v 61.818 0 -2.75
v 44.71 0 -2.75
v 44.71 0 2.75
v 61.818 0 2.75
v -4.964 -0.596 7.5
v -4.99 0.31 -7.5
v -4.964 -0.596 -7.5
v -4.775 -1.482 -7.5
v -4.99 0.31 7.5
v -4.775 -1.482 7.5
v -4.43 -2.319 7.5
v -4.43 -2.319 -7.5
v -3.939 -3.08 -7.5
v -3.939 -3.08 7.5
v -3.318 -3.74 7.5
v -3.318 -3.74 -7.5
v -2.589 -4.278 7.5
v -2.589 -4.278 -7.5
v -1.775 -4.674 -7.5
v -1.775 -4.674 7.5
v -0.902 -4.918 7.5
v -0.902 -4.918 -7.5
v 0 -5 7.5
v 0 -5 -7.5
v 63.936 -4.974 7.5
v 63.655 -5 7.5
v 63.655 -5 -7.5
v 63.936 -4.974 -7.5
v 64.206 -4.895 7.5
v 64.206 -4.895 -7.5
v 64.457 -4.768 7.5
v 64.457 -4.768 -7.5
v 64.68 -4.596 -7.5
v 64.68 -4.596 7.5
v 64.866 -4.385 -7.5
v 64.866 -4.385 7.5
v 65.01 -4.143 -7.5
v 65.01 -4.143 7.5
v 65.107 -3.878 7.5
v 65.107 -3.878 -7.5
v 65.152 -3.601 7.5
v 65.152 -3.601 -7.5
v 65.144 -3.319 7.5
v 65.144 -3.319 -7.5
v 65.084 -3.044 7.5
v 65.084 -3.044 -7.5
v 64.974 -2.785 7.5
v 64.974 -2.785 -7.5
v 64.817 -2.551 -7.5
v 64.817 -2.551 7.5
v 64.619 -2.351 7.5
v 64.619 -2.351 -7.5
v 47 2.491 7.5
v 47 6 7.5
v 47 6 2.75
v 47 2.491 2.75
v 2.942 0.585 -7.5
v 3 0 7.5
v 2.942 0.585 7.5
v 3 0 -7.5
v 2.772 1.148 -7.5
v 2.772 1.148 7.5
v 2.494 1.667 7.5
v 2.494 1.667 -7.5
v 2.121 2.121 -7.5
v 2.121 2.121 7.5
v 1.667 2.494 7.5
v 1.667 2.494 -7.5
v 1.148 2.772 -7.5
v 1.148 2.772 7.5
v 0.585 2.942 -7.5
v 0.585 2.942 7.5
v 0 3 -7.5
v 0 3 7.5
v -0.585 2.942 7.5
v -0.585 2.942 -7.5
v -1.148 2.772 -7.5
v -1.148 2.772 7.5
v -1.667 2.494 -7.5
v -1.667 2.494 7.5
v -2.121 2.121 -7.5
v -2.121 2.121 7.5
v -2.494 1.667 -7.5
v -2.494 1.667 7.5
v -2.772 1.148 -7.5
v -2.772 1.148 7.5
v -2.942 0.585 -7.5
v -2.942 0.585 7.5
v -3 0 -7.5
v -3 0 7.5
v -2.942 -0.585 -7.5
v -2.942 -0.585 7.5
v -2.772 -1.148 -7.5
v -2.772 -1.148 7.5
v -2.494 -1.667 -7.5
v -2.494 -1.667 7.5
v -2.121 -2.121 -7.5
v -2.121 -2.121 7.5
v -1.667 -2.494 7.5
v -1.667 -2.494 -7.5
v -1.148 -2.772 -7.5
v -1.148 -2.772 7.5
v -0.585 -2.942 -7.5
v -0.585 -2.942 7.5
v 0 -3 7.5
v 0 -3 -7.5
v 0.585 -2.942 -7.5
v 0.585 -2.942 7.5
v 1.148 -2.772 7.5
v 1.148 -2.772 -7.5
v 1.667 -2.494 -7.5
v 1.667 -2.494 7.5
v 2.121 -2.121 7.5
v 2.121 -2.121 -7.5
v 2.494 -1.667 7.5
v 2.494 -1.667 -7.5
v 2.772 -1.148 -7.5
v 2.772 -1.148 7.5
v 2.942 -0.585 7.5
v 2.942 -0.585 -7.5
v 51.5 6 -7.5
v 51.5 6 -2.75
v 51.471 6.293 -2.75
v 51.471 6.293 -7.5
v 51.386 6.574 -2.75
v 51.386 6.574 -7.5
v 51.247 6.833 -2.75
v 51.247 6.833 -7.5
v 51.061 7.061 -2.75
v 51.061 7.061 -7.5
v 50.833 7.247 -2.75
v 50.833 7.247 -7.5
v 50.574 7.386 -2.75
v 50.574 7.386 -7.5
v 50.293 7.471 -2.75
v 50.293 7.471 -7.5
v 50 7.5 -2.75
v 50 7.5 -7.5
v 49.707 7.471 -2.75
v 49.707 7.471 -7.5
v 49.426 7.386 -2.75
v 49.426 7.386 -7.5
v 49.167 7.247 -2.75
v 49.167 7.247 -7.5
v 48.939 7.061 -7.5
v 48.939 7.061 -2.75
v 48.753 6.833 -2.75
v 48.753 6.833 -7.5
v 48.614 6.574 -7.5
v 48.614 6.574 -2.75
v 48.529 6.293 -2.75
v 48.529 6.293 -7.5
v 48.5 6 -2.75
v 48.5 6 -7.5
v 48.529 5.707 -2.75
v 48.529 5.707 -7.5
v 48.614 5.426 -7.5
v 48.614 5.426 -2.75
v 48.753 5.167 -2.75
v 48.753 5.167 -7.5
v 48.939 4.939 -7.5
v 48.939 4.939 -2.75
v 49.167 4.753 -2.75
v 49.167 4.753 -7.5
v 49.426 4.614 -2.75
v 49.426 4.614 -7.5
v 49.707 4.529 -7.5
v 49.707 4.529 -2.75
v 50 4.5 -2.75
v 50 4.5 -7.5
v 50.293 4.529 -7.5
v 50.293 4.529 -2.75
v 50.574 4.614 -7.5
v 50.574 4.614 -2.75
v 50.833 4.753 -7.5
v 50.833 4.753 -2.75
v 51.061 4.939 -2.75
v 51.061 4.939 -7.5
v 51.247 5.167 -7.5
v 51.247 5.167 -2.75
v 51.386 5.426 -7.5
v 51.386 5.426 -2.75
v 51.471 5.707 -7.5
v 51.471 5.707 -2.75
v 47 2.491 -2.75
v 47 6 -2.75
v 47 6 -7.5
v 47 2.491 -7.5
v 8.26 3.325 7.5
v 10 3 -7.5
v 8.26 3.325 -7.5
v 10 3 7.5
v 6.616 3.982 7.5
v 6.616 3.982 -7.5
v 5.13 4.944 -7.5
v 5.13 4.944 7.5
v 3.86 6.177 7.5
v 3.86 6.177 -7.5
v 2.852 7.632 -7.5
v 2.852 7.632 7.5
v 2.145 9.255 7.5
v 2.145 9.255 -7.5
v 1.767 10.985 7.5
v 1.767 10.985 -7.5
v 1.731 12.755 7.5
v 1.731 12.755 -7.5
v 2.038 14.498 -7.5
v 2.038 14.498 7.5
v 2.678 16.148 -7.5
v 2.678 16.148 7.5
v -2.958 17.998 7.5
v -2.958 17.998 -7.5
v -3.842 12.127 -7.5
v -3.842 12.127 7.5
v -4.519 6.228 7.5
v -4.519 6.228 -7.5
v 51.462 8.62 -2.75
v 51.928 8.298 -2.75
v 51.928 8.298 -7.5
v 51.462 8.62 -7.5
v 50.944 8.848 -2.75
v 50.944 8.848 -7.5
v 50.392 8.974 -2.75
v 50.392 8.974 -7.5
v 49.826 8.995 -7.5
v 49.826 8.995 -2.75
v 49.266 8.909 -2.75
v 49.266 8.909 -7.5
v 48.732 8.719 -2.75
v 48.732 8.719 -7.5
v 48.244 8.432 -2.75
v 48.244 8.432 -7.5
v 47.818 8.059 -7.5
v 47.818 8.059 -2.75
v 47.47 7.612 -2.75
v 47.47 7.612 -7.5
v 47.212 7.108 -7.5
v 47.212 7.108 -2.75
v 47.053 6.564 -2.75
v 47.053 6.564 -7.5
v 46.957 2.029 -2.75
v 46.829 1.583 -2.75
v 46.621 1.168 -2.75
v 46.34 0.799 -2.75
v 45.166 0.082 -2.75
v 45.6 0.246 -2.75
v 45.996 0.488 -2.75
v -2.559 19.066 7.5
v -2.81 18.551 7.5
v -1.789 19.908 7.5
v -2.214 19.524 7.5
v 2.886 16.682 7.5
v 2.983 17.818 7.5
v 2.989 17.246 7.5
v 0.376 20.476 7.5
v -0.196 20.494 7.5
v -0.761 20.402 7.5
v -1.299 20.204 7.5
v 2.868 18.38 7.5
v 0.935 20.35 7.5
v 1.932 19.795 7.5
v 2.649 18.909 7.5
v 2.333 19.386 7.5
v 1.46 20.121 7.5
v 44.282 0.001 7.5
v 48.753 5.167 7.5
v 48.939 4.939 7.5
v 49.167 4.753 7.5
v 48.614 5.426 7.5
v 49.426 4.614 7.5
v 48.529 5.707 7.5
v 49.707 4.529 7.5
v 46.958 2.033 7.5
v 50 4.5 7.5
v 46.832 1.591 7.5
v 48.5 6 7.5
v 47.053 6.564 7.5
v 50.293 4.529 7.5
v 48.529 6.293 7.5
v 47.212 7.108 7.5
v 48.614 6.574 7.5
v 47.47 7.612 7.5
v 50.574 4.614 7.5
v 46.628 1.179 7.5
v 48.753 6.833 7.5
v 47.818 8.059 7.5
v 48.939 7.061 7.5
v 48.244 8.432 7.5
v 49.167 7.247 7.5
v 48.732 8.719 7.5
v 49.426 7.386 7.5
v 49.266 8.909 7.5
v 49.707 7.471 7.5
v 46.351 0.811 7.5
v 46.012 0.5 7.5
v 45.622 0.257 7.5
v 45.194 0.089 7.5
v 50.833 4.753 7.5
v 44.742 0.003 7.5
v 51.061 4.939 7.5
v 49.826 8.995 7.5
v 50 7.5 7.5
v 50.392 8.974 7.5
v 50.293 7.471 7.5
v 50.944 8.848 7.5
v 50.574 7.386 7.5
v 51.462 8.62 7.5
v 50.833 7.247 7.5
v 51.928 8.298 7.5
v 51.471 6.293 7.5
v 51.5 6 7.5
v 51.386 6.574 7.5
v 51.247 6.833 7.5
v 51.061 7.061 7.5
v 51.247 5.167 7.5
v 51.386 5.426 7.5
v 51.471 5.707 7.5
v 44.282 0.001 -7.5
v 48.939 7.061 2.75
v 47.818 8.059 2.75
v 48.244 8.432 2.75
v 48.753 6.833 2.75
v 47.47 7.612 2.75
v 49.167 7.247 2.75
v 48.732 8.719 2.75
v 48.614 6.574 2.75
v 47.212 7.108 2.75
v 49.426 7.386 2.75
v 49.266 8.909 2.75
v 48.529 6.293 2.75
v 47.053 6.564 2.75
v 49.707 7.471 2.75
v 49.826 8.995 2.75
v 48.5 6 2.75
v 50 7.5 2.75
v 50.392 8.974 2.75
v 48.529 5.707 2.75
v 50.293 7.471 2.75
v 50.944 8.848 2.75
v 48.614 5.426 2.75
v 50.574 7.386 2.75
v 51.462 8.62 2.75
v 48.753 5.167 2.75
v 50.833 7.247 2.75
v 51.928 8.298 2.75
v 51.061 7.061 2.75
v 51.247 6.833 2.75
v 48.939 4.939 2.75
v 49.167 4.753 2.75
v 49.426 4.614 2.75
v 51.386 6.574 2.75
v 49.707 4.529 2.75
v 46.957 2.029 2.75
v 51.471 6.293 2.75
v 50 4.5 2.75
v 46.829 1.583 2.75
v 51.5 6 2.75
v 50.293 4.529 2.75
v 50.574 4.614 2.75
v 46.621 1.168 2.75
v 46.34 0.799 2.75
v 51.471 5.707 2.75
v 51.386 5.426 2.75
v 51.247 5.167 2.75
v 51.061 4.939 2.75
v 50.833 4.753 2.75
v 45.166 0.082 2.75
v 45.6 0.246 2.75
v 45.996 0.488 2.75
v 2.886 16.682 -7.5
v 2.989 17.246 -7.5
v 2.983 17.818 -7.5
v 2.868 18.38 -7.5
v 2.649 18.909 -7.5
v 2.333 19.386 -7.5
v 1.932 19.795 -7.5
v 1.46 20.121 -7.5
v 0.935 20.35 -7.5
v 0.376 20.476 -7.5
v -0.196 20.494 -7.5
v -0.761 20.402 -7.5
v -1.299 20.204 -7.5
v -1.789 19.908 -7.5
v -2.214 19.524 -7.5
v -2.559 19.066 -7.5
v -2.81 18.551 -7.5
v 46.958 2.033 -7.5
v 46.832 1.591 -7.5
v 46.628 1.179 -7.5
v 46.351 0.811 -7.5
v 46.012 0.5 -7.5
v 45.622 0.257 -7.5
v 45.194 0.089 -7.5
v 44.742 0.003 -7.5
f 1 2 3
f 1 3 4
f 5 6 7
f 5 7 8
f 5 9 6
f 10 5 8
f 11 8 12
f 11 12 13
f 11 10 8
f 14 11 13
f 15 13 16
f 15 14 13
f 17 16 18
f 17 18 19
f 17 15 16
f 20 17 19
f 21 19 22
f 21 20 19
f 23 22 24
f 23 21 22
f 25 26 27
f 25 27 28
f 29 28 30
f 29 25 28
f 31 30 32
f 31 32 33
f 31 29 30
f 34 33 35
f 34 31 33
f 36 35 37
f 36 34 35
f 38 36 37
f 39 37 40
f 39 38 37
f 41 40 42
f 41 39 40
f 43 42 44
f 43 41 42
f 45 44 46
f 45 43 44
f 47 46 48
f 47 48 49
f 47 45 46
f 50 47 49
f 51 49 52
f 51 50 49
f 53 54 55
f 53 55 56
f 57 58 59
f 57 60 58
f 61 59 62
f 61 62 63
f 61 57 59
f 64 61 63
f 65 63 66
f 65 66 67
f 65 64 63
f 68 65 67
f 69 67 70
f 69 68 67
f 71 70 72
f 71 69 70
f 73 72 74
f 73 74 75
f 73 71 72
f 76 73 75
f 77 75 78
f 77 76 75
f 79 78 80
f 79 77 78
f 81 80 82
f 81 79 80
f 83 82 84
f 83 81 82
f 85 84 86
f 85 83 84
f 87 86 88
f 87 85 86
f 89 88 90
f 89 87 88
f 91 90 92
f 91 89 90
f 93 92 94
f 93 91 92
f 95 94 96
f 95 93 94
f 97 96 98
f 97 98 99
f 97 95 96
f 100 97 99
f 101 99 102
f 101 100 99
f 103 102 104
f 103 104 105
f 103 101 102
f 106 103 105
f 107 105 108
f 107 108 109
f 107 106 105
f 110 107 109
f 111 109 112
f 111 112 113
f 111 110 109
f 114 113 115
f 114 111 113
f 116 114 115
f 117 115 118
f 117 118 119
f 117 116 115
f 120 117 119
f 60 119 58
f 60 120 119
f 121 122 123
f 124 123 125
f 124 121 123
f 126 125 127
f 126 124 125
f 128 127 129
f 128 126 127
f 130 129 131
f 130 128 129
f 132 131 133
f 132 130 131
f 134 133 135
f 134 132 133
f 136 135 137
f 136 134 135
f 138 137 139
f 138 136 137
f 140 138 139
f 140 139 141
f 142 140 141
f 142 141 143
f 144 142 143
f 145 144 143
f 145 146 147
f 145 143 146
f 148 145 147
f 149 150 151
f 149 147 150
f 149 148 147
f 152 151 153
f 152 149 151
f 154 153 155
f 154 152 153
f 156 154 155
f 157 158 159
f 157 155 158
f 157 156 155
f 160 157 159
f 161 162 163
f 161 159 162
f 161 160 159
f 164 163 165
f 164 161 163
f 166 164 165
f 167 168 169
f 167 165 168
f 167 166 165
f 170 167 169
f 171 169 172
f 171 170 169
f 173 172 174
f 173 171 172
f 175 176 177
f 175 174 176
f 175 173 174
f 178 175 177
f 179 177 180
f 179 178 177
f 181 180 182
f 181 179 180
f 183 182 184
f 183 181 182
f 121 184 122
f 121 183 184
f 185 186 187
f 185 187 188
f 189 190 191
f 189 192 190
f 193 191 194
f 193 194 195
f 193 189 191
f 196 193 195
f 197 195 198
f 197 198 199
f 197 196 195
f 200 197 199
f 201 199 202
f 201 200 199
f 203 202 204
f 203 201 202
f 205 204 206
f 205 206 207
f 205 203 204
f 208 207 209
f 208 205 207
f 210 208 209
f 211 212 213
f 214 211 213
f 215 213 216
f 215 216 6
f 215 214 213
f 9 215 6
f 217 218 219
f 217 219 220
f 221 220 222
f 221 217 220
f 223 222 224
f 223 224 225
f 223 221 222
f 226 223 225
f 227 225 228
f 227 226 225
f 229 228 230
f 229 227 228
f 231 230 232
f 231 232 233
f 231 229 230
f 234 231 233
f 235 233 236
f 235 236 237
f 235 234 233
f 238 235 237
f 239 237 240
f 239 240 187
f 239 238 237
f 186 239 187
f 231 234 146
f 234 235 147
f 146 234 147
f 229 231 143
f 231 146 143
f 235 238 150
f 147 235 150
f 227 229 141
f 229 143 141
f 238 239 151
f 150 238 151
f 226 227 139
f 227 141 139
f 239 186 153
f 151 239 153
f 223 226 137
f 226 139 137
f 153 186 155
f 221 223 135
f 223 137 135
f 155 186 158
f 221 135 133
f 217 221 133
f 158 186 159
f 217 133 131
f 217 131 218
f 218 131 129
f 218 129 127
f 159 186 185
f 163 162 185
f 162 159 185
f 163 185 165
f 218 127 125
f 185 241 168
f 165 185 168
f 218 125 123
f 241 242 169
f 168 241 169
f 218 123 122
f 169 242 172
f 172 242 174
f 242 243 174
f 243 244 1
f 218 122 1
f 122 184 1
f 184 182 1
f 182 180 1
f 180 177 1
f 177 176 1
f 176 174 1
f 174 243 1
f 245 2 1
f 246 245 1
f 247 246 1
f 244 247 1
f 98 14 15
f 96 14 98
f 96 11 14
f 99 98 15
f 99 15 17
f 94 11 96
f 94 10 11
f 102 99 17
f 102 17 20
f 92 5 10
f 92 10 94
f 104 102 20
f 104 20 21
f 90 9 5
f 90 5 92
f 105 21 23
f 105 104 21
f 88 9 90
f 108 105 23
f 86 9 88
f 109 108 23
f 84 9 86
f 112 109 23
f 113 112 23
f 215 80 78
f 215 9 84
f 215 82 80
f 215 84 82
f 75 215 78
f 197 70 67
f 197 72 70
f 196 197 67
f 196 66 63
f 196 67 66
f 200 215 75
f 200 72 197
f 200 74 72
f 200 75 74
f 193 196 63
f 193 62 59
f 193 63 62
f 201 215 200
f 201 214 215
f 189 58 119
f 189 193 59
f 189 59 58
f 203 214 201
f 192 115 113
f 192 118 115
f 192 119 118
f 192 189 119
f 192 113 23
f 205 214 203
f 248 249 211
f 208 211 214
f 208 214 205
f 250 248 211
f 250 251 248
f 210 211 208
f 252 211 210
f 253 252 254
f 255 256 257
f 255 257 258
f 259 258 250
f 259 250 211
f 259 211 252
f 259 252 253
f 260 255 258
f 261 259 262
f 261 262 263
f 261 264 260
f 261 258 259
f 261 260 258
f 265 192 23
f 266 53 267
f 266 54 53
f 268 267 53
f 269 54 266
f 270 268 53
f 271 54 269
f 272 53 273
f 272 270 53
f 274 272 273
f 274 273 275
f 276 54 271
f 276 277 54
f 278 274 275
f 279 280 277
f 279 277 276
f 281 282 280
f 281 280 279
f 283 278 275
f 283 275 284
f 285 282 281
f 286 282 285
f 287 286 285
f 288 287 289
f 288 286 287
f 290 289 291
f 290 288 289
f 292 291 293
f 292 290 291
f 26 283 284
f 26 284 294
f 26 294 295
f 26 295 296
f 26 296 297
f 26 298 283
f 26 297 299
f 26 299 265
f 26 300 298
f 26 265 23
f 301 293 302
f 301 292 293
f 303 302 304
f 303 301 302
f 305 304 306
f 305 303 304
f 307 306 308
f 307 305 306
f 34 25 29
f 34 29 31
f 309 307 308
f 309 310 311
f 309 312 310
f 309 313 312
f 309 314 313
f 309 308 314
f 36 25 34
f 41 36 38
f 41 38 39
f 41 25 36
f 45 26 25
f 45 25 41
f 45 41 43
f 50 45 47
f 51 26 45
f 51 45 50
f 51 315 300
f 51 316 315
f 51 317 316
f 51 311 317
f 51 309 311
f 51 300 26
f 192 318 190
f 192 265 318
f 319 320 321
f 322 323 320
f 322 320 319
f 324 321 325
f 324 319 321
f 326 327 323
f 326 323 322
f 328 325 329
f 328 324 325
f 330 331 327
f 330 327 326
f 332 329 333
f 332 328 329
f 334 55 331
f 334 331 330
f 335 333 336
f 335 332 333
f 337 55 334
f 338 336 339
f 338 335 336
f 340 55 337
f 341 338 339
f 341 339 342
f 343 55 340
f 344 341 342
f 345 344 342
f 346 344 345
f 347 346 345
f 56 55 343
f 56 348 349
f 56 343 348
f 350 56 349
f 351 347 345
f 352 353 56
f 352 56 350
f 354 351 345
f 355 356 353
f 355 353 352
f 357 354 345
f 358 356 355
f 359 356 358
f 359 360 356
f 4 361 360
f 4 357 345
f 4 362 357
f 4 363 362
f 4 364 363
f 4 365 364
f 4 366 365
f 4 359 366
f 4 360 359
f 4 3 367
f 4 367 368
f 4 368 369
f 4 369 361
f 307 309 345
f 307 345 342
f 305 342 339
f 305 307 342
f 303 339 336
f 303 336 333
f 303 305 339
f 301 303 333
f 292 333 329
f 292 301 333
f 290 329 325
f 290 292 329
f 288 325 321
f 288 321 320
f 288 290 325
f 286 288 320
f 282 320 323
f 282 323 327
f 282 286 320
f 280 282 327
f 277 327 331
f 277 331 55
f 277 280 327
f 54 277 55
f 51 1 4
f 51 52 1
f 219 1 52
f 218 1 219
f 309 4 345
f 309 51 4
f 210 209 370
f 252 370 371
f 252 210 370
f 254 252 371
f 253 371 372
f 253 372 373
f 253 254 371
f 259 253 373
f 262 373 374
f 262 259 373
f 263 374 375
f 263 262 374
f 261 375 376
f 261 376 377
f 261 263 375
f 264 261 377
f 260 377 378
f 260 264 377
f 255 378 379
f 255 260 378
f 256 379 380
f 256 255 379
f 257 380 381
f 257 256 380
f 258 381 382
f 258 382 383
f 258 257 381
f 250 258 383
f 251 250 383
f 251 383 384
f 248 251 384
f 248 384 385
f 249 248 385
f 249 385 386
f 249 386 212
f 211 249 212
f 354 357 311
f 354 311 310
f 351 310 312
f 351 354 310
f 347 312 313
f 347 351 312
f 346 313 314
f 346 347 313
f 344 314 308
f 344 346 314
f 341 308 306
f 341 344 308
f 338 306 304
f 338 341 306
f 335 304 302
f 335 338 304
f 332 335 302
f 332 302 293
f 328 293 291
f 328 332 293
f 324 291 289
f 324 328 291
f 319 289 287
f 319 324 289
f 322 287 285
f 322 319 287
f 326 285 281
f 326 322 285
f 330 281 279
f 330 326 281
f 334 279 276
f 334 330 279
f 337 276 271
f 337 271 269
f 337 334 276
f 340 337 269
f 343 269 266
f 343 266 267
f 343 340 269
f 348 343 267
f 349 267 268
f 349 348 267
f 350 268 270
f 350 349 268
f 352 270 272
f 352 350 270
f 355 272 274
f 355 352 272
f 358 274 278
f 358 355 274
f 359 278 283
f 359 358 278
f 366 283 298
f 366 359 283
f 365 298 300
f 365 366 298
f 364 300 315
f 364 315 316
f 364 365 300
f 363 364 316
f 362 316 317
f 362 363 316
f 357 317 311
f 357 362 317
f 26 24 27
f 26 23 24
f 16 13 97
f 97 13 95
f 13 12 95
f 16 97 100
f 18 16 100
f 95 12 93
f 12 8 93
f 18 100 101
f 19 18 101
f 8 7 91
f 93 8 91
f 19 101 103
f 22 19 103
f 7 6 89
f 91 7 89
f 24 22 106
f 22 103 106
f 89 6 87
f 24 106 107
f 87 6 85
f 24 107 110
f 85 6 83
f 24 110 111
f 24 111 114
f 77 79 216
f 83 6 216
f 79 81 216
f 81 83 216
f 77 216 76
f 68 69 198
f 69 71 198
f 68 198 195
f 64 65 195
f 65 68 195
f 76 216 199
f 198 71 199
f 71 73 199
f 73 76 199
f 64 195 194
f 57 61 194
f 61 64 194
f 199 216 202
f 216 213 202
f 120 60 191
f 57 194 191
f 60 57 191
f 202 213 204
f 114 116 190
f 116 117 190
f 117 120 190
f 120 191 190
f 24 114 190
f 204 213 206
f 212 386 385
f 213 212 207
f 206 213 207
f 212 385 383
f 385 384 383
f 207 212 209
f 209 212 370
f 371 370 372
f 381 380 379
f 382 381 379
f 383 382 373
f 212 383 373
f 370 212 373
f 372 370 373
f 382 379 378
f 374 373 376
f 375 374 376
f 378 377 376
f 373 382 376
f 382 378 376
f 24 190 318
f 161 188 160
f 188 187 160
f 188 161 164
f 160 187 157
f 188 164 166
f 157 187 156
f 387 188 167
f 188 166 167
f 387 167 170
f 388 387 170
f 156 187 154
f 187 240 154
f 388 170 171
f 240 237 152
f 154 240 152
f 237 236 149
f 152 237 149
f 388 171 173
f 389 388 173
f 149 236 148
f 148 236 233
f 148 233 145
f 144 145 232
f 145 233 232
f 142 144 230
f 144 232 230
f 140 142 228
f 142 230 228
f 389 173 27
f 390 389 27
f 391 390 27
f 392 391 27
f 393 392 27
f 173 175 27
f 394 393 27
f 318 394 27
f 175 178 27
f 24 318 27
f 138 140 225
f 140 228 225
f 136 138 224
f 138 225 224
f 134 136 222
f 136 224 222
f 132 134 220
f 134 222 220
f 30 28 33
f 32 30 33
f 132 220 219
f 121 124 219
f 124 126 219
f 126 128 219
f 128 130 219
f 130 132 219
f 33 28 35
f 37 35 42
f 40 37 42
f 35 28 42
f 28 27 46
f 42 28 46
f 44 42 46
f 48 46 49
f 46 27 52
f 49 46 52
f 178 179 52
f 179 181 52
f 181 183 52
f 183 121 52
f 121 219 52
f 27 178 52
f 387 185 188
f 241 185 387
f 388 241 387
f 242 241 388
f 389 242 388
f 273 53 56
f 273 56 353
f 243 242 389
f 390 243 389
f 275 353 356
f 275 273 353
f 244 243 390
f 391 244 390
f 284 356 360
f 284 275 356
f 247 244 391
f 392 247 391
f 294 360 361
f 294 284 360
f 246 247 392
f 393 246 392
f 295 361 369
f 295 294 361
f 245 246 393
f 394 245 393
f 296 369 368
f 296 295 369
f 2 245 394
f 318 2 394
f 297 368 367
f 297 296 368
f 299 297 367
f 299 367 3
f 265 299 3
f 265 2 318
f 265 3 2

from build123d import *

# Parameters (mm, degrees)
SKETCH1_R           = 3
SKETCH1_R_2         = 1.5
BOSS_EXTRUDE1_DEPTH = 7.5
CUT_EXTRUDE1_REACH  = 70.715
SKETCH2_W           = 20.337315641
SKETCH2_H           = 5.5


with BuildPart() as part:
    # Sketch1 → Boss-Extrude1 (new, symmetric)
    with BuildSketch(Plane.XY):
        with BuildLine():
            Line((0, -5), (63.65524487, -5))
            ThreePointArc((63.65524487, -5), (65.064783801, -4.013030215), (64.619426284, -2.350933335))
            Line((64.619426284, -2.350933335), (51.928362829, 8.298133329))
            ThreePointArc((51.928362829, 8.298133329), (48.732145215, 8.718923361), (47, 6))
            Line((47, 6), (47, 2.491190702))
            ThreePointArc((47, 2.491190702), (46.188975519, 0.64799736), (44.282110643, 0.000703957))
            Line((44.282110643, 0.000703957), (10, 3))
            ThreePointArc((10, 3), (2.85176017, 7.632257918), (2.678290028, 16.148422208))
            ThreePointArc((2.678290028, 16.148422208), (0.935327464, 20.350467073), (-2.958378986, 17.997989735))
            ThreePointArc((-2.958378986, 17.997989735), (-4.206114513, 9.18048564), (-4.990396875, 0.30974026))
            ThreePointArc((-4.990396875, 0.30974026), (-3.643398228, -3.424273551), (0, -5))
        make_face()
        Circle(SKETCH1_R, mode=Mode.SUBTRACT)
        with Locations((50, 6)):
            Circle(SKETCH1_R_2, mode=Mode.SUBTRACT)
    extrude(amount=BOSS_EXTRUDE1_DEPTH, both=True)

    # Sketch2 → Cut-Extrude1 (cut, up to next)
    with BuildSketch(Plane(origin=(0, 0, 0), x_dir=(1, 0, 0), z_dir=(0, 1, 0)), mode=Mode.PRIVATE) as cut_extrude1_sk1:
        with Locations((54.450768463, 0)):
            Rectangle(SKETCH2_W, SKETCH2_H)
    cut_extrude1_tool1 = extrude(cut_extrude1_sk1.sketch, amount=CUT_EXTRUDE1_REACH, mode=Mode.PRIVATE) & part.part
    add(cut_extrude1_tool1.solids().sort_by_distance((54.450768, 0, 0))[0], mode=Mode.SUBTRACT)


solid = part.part
